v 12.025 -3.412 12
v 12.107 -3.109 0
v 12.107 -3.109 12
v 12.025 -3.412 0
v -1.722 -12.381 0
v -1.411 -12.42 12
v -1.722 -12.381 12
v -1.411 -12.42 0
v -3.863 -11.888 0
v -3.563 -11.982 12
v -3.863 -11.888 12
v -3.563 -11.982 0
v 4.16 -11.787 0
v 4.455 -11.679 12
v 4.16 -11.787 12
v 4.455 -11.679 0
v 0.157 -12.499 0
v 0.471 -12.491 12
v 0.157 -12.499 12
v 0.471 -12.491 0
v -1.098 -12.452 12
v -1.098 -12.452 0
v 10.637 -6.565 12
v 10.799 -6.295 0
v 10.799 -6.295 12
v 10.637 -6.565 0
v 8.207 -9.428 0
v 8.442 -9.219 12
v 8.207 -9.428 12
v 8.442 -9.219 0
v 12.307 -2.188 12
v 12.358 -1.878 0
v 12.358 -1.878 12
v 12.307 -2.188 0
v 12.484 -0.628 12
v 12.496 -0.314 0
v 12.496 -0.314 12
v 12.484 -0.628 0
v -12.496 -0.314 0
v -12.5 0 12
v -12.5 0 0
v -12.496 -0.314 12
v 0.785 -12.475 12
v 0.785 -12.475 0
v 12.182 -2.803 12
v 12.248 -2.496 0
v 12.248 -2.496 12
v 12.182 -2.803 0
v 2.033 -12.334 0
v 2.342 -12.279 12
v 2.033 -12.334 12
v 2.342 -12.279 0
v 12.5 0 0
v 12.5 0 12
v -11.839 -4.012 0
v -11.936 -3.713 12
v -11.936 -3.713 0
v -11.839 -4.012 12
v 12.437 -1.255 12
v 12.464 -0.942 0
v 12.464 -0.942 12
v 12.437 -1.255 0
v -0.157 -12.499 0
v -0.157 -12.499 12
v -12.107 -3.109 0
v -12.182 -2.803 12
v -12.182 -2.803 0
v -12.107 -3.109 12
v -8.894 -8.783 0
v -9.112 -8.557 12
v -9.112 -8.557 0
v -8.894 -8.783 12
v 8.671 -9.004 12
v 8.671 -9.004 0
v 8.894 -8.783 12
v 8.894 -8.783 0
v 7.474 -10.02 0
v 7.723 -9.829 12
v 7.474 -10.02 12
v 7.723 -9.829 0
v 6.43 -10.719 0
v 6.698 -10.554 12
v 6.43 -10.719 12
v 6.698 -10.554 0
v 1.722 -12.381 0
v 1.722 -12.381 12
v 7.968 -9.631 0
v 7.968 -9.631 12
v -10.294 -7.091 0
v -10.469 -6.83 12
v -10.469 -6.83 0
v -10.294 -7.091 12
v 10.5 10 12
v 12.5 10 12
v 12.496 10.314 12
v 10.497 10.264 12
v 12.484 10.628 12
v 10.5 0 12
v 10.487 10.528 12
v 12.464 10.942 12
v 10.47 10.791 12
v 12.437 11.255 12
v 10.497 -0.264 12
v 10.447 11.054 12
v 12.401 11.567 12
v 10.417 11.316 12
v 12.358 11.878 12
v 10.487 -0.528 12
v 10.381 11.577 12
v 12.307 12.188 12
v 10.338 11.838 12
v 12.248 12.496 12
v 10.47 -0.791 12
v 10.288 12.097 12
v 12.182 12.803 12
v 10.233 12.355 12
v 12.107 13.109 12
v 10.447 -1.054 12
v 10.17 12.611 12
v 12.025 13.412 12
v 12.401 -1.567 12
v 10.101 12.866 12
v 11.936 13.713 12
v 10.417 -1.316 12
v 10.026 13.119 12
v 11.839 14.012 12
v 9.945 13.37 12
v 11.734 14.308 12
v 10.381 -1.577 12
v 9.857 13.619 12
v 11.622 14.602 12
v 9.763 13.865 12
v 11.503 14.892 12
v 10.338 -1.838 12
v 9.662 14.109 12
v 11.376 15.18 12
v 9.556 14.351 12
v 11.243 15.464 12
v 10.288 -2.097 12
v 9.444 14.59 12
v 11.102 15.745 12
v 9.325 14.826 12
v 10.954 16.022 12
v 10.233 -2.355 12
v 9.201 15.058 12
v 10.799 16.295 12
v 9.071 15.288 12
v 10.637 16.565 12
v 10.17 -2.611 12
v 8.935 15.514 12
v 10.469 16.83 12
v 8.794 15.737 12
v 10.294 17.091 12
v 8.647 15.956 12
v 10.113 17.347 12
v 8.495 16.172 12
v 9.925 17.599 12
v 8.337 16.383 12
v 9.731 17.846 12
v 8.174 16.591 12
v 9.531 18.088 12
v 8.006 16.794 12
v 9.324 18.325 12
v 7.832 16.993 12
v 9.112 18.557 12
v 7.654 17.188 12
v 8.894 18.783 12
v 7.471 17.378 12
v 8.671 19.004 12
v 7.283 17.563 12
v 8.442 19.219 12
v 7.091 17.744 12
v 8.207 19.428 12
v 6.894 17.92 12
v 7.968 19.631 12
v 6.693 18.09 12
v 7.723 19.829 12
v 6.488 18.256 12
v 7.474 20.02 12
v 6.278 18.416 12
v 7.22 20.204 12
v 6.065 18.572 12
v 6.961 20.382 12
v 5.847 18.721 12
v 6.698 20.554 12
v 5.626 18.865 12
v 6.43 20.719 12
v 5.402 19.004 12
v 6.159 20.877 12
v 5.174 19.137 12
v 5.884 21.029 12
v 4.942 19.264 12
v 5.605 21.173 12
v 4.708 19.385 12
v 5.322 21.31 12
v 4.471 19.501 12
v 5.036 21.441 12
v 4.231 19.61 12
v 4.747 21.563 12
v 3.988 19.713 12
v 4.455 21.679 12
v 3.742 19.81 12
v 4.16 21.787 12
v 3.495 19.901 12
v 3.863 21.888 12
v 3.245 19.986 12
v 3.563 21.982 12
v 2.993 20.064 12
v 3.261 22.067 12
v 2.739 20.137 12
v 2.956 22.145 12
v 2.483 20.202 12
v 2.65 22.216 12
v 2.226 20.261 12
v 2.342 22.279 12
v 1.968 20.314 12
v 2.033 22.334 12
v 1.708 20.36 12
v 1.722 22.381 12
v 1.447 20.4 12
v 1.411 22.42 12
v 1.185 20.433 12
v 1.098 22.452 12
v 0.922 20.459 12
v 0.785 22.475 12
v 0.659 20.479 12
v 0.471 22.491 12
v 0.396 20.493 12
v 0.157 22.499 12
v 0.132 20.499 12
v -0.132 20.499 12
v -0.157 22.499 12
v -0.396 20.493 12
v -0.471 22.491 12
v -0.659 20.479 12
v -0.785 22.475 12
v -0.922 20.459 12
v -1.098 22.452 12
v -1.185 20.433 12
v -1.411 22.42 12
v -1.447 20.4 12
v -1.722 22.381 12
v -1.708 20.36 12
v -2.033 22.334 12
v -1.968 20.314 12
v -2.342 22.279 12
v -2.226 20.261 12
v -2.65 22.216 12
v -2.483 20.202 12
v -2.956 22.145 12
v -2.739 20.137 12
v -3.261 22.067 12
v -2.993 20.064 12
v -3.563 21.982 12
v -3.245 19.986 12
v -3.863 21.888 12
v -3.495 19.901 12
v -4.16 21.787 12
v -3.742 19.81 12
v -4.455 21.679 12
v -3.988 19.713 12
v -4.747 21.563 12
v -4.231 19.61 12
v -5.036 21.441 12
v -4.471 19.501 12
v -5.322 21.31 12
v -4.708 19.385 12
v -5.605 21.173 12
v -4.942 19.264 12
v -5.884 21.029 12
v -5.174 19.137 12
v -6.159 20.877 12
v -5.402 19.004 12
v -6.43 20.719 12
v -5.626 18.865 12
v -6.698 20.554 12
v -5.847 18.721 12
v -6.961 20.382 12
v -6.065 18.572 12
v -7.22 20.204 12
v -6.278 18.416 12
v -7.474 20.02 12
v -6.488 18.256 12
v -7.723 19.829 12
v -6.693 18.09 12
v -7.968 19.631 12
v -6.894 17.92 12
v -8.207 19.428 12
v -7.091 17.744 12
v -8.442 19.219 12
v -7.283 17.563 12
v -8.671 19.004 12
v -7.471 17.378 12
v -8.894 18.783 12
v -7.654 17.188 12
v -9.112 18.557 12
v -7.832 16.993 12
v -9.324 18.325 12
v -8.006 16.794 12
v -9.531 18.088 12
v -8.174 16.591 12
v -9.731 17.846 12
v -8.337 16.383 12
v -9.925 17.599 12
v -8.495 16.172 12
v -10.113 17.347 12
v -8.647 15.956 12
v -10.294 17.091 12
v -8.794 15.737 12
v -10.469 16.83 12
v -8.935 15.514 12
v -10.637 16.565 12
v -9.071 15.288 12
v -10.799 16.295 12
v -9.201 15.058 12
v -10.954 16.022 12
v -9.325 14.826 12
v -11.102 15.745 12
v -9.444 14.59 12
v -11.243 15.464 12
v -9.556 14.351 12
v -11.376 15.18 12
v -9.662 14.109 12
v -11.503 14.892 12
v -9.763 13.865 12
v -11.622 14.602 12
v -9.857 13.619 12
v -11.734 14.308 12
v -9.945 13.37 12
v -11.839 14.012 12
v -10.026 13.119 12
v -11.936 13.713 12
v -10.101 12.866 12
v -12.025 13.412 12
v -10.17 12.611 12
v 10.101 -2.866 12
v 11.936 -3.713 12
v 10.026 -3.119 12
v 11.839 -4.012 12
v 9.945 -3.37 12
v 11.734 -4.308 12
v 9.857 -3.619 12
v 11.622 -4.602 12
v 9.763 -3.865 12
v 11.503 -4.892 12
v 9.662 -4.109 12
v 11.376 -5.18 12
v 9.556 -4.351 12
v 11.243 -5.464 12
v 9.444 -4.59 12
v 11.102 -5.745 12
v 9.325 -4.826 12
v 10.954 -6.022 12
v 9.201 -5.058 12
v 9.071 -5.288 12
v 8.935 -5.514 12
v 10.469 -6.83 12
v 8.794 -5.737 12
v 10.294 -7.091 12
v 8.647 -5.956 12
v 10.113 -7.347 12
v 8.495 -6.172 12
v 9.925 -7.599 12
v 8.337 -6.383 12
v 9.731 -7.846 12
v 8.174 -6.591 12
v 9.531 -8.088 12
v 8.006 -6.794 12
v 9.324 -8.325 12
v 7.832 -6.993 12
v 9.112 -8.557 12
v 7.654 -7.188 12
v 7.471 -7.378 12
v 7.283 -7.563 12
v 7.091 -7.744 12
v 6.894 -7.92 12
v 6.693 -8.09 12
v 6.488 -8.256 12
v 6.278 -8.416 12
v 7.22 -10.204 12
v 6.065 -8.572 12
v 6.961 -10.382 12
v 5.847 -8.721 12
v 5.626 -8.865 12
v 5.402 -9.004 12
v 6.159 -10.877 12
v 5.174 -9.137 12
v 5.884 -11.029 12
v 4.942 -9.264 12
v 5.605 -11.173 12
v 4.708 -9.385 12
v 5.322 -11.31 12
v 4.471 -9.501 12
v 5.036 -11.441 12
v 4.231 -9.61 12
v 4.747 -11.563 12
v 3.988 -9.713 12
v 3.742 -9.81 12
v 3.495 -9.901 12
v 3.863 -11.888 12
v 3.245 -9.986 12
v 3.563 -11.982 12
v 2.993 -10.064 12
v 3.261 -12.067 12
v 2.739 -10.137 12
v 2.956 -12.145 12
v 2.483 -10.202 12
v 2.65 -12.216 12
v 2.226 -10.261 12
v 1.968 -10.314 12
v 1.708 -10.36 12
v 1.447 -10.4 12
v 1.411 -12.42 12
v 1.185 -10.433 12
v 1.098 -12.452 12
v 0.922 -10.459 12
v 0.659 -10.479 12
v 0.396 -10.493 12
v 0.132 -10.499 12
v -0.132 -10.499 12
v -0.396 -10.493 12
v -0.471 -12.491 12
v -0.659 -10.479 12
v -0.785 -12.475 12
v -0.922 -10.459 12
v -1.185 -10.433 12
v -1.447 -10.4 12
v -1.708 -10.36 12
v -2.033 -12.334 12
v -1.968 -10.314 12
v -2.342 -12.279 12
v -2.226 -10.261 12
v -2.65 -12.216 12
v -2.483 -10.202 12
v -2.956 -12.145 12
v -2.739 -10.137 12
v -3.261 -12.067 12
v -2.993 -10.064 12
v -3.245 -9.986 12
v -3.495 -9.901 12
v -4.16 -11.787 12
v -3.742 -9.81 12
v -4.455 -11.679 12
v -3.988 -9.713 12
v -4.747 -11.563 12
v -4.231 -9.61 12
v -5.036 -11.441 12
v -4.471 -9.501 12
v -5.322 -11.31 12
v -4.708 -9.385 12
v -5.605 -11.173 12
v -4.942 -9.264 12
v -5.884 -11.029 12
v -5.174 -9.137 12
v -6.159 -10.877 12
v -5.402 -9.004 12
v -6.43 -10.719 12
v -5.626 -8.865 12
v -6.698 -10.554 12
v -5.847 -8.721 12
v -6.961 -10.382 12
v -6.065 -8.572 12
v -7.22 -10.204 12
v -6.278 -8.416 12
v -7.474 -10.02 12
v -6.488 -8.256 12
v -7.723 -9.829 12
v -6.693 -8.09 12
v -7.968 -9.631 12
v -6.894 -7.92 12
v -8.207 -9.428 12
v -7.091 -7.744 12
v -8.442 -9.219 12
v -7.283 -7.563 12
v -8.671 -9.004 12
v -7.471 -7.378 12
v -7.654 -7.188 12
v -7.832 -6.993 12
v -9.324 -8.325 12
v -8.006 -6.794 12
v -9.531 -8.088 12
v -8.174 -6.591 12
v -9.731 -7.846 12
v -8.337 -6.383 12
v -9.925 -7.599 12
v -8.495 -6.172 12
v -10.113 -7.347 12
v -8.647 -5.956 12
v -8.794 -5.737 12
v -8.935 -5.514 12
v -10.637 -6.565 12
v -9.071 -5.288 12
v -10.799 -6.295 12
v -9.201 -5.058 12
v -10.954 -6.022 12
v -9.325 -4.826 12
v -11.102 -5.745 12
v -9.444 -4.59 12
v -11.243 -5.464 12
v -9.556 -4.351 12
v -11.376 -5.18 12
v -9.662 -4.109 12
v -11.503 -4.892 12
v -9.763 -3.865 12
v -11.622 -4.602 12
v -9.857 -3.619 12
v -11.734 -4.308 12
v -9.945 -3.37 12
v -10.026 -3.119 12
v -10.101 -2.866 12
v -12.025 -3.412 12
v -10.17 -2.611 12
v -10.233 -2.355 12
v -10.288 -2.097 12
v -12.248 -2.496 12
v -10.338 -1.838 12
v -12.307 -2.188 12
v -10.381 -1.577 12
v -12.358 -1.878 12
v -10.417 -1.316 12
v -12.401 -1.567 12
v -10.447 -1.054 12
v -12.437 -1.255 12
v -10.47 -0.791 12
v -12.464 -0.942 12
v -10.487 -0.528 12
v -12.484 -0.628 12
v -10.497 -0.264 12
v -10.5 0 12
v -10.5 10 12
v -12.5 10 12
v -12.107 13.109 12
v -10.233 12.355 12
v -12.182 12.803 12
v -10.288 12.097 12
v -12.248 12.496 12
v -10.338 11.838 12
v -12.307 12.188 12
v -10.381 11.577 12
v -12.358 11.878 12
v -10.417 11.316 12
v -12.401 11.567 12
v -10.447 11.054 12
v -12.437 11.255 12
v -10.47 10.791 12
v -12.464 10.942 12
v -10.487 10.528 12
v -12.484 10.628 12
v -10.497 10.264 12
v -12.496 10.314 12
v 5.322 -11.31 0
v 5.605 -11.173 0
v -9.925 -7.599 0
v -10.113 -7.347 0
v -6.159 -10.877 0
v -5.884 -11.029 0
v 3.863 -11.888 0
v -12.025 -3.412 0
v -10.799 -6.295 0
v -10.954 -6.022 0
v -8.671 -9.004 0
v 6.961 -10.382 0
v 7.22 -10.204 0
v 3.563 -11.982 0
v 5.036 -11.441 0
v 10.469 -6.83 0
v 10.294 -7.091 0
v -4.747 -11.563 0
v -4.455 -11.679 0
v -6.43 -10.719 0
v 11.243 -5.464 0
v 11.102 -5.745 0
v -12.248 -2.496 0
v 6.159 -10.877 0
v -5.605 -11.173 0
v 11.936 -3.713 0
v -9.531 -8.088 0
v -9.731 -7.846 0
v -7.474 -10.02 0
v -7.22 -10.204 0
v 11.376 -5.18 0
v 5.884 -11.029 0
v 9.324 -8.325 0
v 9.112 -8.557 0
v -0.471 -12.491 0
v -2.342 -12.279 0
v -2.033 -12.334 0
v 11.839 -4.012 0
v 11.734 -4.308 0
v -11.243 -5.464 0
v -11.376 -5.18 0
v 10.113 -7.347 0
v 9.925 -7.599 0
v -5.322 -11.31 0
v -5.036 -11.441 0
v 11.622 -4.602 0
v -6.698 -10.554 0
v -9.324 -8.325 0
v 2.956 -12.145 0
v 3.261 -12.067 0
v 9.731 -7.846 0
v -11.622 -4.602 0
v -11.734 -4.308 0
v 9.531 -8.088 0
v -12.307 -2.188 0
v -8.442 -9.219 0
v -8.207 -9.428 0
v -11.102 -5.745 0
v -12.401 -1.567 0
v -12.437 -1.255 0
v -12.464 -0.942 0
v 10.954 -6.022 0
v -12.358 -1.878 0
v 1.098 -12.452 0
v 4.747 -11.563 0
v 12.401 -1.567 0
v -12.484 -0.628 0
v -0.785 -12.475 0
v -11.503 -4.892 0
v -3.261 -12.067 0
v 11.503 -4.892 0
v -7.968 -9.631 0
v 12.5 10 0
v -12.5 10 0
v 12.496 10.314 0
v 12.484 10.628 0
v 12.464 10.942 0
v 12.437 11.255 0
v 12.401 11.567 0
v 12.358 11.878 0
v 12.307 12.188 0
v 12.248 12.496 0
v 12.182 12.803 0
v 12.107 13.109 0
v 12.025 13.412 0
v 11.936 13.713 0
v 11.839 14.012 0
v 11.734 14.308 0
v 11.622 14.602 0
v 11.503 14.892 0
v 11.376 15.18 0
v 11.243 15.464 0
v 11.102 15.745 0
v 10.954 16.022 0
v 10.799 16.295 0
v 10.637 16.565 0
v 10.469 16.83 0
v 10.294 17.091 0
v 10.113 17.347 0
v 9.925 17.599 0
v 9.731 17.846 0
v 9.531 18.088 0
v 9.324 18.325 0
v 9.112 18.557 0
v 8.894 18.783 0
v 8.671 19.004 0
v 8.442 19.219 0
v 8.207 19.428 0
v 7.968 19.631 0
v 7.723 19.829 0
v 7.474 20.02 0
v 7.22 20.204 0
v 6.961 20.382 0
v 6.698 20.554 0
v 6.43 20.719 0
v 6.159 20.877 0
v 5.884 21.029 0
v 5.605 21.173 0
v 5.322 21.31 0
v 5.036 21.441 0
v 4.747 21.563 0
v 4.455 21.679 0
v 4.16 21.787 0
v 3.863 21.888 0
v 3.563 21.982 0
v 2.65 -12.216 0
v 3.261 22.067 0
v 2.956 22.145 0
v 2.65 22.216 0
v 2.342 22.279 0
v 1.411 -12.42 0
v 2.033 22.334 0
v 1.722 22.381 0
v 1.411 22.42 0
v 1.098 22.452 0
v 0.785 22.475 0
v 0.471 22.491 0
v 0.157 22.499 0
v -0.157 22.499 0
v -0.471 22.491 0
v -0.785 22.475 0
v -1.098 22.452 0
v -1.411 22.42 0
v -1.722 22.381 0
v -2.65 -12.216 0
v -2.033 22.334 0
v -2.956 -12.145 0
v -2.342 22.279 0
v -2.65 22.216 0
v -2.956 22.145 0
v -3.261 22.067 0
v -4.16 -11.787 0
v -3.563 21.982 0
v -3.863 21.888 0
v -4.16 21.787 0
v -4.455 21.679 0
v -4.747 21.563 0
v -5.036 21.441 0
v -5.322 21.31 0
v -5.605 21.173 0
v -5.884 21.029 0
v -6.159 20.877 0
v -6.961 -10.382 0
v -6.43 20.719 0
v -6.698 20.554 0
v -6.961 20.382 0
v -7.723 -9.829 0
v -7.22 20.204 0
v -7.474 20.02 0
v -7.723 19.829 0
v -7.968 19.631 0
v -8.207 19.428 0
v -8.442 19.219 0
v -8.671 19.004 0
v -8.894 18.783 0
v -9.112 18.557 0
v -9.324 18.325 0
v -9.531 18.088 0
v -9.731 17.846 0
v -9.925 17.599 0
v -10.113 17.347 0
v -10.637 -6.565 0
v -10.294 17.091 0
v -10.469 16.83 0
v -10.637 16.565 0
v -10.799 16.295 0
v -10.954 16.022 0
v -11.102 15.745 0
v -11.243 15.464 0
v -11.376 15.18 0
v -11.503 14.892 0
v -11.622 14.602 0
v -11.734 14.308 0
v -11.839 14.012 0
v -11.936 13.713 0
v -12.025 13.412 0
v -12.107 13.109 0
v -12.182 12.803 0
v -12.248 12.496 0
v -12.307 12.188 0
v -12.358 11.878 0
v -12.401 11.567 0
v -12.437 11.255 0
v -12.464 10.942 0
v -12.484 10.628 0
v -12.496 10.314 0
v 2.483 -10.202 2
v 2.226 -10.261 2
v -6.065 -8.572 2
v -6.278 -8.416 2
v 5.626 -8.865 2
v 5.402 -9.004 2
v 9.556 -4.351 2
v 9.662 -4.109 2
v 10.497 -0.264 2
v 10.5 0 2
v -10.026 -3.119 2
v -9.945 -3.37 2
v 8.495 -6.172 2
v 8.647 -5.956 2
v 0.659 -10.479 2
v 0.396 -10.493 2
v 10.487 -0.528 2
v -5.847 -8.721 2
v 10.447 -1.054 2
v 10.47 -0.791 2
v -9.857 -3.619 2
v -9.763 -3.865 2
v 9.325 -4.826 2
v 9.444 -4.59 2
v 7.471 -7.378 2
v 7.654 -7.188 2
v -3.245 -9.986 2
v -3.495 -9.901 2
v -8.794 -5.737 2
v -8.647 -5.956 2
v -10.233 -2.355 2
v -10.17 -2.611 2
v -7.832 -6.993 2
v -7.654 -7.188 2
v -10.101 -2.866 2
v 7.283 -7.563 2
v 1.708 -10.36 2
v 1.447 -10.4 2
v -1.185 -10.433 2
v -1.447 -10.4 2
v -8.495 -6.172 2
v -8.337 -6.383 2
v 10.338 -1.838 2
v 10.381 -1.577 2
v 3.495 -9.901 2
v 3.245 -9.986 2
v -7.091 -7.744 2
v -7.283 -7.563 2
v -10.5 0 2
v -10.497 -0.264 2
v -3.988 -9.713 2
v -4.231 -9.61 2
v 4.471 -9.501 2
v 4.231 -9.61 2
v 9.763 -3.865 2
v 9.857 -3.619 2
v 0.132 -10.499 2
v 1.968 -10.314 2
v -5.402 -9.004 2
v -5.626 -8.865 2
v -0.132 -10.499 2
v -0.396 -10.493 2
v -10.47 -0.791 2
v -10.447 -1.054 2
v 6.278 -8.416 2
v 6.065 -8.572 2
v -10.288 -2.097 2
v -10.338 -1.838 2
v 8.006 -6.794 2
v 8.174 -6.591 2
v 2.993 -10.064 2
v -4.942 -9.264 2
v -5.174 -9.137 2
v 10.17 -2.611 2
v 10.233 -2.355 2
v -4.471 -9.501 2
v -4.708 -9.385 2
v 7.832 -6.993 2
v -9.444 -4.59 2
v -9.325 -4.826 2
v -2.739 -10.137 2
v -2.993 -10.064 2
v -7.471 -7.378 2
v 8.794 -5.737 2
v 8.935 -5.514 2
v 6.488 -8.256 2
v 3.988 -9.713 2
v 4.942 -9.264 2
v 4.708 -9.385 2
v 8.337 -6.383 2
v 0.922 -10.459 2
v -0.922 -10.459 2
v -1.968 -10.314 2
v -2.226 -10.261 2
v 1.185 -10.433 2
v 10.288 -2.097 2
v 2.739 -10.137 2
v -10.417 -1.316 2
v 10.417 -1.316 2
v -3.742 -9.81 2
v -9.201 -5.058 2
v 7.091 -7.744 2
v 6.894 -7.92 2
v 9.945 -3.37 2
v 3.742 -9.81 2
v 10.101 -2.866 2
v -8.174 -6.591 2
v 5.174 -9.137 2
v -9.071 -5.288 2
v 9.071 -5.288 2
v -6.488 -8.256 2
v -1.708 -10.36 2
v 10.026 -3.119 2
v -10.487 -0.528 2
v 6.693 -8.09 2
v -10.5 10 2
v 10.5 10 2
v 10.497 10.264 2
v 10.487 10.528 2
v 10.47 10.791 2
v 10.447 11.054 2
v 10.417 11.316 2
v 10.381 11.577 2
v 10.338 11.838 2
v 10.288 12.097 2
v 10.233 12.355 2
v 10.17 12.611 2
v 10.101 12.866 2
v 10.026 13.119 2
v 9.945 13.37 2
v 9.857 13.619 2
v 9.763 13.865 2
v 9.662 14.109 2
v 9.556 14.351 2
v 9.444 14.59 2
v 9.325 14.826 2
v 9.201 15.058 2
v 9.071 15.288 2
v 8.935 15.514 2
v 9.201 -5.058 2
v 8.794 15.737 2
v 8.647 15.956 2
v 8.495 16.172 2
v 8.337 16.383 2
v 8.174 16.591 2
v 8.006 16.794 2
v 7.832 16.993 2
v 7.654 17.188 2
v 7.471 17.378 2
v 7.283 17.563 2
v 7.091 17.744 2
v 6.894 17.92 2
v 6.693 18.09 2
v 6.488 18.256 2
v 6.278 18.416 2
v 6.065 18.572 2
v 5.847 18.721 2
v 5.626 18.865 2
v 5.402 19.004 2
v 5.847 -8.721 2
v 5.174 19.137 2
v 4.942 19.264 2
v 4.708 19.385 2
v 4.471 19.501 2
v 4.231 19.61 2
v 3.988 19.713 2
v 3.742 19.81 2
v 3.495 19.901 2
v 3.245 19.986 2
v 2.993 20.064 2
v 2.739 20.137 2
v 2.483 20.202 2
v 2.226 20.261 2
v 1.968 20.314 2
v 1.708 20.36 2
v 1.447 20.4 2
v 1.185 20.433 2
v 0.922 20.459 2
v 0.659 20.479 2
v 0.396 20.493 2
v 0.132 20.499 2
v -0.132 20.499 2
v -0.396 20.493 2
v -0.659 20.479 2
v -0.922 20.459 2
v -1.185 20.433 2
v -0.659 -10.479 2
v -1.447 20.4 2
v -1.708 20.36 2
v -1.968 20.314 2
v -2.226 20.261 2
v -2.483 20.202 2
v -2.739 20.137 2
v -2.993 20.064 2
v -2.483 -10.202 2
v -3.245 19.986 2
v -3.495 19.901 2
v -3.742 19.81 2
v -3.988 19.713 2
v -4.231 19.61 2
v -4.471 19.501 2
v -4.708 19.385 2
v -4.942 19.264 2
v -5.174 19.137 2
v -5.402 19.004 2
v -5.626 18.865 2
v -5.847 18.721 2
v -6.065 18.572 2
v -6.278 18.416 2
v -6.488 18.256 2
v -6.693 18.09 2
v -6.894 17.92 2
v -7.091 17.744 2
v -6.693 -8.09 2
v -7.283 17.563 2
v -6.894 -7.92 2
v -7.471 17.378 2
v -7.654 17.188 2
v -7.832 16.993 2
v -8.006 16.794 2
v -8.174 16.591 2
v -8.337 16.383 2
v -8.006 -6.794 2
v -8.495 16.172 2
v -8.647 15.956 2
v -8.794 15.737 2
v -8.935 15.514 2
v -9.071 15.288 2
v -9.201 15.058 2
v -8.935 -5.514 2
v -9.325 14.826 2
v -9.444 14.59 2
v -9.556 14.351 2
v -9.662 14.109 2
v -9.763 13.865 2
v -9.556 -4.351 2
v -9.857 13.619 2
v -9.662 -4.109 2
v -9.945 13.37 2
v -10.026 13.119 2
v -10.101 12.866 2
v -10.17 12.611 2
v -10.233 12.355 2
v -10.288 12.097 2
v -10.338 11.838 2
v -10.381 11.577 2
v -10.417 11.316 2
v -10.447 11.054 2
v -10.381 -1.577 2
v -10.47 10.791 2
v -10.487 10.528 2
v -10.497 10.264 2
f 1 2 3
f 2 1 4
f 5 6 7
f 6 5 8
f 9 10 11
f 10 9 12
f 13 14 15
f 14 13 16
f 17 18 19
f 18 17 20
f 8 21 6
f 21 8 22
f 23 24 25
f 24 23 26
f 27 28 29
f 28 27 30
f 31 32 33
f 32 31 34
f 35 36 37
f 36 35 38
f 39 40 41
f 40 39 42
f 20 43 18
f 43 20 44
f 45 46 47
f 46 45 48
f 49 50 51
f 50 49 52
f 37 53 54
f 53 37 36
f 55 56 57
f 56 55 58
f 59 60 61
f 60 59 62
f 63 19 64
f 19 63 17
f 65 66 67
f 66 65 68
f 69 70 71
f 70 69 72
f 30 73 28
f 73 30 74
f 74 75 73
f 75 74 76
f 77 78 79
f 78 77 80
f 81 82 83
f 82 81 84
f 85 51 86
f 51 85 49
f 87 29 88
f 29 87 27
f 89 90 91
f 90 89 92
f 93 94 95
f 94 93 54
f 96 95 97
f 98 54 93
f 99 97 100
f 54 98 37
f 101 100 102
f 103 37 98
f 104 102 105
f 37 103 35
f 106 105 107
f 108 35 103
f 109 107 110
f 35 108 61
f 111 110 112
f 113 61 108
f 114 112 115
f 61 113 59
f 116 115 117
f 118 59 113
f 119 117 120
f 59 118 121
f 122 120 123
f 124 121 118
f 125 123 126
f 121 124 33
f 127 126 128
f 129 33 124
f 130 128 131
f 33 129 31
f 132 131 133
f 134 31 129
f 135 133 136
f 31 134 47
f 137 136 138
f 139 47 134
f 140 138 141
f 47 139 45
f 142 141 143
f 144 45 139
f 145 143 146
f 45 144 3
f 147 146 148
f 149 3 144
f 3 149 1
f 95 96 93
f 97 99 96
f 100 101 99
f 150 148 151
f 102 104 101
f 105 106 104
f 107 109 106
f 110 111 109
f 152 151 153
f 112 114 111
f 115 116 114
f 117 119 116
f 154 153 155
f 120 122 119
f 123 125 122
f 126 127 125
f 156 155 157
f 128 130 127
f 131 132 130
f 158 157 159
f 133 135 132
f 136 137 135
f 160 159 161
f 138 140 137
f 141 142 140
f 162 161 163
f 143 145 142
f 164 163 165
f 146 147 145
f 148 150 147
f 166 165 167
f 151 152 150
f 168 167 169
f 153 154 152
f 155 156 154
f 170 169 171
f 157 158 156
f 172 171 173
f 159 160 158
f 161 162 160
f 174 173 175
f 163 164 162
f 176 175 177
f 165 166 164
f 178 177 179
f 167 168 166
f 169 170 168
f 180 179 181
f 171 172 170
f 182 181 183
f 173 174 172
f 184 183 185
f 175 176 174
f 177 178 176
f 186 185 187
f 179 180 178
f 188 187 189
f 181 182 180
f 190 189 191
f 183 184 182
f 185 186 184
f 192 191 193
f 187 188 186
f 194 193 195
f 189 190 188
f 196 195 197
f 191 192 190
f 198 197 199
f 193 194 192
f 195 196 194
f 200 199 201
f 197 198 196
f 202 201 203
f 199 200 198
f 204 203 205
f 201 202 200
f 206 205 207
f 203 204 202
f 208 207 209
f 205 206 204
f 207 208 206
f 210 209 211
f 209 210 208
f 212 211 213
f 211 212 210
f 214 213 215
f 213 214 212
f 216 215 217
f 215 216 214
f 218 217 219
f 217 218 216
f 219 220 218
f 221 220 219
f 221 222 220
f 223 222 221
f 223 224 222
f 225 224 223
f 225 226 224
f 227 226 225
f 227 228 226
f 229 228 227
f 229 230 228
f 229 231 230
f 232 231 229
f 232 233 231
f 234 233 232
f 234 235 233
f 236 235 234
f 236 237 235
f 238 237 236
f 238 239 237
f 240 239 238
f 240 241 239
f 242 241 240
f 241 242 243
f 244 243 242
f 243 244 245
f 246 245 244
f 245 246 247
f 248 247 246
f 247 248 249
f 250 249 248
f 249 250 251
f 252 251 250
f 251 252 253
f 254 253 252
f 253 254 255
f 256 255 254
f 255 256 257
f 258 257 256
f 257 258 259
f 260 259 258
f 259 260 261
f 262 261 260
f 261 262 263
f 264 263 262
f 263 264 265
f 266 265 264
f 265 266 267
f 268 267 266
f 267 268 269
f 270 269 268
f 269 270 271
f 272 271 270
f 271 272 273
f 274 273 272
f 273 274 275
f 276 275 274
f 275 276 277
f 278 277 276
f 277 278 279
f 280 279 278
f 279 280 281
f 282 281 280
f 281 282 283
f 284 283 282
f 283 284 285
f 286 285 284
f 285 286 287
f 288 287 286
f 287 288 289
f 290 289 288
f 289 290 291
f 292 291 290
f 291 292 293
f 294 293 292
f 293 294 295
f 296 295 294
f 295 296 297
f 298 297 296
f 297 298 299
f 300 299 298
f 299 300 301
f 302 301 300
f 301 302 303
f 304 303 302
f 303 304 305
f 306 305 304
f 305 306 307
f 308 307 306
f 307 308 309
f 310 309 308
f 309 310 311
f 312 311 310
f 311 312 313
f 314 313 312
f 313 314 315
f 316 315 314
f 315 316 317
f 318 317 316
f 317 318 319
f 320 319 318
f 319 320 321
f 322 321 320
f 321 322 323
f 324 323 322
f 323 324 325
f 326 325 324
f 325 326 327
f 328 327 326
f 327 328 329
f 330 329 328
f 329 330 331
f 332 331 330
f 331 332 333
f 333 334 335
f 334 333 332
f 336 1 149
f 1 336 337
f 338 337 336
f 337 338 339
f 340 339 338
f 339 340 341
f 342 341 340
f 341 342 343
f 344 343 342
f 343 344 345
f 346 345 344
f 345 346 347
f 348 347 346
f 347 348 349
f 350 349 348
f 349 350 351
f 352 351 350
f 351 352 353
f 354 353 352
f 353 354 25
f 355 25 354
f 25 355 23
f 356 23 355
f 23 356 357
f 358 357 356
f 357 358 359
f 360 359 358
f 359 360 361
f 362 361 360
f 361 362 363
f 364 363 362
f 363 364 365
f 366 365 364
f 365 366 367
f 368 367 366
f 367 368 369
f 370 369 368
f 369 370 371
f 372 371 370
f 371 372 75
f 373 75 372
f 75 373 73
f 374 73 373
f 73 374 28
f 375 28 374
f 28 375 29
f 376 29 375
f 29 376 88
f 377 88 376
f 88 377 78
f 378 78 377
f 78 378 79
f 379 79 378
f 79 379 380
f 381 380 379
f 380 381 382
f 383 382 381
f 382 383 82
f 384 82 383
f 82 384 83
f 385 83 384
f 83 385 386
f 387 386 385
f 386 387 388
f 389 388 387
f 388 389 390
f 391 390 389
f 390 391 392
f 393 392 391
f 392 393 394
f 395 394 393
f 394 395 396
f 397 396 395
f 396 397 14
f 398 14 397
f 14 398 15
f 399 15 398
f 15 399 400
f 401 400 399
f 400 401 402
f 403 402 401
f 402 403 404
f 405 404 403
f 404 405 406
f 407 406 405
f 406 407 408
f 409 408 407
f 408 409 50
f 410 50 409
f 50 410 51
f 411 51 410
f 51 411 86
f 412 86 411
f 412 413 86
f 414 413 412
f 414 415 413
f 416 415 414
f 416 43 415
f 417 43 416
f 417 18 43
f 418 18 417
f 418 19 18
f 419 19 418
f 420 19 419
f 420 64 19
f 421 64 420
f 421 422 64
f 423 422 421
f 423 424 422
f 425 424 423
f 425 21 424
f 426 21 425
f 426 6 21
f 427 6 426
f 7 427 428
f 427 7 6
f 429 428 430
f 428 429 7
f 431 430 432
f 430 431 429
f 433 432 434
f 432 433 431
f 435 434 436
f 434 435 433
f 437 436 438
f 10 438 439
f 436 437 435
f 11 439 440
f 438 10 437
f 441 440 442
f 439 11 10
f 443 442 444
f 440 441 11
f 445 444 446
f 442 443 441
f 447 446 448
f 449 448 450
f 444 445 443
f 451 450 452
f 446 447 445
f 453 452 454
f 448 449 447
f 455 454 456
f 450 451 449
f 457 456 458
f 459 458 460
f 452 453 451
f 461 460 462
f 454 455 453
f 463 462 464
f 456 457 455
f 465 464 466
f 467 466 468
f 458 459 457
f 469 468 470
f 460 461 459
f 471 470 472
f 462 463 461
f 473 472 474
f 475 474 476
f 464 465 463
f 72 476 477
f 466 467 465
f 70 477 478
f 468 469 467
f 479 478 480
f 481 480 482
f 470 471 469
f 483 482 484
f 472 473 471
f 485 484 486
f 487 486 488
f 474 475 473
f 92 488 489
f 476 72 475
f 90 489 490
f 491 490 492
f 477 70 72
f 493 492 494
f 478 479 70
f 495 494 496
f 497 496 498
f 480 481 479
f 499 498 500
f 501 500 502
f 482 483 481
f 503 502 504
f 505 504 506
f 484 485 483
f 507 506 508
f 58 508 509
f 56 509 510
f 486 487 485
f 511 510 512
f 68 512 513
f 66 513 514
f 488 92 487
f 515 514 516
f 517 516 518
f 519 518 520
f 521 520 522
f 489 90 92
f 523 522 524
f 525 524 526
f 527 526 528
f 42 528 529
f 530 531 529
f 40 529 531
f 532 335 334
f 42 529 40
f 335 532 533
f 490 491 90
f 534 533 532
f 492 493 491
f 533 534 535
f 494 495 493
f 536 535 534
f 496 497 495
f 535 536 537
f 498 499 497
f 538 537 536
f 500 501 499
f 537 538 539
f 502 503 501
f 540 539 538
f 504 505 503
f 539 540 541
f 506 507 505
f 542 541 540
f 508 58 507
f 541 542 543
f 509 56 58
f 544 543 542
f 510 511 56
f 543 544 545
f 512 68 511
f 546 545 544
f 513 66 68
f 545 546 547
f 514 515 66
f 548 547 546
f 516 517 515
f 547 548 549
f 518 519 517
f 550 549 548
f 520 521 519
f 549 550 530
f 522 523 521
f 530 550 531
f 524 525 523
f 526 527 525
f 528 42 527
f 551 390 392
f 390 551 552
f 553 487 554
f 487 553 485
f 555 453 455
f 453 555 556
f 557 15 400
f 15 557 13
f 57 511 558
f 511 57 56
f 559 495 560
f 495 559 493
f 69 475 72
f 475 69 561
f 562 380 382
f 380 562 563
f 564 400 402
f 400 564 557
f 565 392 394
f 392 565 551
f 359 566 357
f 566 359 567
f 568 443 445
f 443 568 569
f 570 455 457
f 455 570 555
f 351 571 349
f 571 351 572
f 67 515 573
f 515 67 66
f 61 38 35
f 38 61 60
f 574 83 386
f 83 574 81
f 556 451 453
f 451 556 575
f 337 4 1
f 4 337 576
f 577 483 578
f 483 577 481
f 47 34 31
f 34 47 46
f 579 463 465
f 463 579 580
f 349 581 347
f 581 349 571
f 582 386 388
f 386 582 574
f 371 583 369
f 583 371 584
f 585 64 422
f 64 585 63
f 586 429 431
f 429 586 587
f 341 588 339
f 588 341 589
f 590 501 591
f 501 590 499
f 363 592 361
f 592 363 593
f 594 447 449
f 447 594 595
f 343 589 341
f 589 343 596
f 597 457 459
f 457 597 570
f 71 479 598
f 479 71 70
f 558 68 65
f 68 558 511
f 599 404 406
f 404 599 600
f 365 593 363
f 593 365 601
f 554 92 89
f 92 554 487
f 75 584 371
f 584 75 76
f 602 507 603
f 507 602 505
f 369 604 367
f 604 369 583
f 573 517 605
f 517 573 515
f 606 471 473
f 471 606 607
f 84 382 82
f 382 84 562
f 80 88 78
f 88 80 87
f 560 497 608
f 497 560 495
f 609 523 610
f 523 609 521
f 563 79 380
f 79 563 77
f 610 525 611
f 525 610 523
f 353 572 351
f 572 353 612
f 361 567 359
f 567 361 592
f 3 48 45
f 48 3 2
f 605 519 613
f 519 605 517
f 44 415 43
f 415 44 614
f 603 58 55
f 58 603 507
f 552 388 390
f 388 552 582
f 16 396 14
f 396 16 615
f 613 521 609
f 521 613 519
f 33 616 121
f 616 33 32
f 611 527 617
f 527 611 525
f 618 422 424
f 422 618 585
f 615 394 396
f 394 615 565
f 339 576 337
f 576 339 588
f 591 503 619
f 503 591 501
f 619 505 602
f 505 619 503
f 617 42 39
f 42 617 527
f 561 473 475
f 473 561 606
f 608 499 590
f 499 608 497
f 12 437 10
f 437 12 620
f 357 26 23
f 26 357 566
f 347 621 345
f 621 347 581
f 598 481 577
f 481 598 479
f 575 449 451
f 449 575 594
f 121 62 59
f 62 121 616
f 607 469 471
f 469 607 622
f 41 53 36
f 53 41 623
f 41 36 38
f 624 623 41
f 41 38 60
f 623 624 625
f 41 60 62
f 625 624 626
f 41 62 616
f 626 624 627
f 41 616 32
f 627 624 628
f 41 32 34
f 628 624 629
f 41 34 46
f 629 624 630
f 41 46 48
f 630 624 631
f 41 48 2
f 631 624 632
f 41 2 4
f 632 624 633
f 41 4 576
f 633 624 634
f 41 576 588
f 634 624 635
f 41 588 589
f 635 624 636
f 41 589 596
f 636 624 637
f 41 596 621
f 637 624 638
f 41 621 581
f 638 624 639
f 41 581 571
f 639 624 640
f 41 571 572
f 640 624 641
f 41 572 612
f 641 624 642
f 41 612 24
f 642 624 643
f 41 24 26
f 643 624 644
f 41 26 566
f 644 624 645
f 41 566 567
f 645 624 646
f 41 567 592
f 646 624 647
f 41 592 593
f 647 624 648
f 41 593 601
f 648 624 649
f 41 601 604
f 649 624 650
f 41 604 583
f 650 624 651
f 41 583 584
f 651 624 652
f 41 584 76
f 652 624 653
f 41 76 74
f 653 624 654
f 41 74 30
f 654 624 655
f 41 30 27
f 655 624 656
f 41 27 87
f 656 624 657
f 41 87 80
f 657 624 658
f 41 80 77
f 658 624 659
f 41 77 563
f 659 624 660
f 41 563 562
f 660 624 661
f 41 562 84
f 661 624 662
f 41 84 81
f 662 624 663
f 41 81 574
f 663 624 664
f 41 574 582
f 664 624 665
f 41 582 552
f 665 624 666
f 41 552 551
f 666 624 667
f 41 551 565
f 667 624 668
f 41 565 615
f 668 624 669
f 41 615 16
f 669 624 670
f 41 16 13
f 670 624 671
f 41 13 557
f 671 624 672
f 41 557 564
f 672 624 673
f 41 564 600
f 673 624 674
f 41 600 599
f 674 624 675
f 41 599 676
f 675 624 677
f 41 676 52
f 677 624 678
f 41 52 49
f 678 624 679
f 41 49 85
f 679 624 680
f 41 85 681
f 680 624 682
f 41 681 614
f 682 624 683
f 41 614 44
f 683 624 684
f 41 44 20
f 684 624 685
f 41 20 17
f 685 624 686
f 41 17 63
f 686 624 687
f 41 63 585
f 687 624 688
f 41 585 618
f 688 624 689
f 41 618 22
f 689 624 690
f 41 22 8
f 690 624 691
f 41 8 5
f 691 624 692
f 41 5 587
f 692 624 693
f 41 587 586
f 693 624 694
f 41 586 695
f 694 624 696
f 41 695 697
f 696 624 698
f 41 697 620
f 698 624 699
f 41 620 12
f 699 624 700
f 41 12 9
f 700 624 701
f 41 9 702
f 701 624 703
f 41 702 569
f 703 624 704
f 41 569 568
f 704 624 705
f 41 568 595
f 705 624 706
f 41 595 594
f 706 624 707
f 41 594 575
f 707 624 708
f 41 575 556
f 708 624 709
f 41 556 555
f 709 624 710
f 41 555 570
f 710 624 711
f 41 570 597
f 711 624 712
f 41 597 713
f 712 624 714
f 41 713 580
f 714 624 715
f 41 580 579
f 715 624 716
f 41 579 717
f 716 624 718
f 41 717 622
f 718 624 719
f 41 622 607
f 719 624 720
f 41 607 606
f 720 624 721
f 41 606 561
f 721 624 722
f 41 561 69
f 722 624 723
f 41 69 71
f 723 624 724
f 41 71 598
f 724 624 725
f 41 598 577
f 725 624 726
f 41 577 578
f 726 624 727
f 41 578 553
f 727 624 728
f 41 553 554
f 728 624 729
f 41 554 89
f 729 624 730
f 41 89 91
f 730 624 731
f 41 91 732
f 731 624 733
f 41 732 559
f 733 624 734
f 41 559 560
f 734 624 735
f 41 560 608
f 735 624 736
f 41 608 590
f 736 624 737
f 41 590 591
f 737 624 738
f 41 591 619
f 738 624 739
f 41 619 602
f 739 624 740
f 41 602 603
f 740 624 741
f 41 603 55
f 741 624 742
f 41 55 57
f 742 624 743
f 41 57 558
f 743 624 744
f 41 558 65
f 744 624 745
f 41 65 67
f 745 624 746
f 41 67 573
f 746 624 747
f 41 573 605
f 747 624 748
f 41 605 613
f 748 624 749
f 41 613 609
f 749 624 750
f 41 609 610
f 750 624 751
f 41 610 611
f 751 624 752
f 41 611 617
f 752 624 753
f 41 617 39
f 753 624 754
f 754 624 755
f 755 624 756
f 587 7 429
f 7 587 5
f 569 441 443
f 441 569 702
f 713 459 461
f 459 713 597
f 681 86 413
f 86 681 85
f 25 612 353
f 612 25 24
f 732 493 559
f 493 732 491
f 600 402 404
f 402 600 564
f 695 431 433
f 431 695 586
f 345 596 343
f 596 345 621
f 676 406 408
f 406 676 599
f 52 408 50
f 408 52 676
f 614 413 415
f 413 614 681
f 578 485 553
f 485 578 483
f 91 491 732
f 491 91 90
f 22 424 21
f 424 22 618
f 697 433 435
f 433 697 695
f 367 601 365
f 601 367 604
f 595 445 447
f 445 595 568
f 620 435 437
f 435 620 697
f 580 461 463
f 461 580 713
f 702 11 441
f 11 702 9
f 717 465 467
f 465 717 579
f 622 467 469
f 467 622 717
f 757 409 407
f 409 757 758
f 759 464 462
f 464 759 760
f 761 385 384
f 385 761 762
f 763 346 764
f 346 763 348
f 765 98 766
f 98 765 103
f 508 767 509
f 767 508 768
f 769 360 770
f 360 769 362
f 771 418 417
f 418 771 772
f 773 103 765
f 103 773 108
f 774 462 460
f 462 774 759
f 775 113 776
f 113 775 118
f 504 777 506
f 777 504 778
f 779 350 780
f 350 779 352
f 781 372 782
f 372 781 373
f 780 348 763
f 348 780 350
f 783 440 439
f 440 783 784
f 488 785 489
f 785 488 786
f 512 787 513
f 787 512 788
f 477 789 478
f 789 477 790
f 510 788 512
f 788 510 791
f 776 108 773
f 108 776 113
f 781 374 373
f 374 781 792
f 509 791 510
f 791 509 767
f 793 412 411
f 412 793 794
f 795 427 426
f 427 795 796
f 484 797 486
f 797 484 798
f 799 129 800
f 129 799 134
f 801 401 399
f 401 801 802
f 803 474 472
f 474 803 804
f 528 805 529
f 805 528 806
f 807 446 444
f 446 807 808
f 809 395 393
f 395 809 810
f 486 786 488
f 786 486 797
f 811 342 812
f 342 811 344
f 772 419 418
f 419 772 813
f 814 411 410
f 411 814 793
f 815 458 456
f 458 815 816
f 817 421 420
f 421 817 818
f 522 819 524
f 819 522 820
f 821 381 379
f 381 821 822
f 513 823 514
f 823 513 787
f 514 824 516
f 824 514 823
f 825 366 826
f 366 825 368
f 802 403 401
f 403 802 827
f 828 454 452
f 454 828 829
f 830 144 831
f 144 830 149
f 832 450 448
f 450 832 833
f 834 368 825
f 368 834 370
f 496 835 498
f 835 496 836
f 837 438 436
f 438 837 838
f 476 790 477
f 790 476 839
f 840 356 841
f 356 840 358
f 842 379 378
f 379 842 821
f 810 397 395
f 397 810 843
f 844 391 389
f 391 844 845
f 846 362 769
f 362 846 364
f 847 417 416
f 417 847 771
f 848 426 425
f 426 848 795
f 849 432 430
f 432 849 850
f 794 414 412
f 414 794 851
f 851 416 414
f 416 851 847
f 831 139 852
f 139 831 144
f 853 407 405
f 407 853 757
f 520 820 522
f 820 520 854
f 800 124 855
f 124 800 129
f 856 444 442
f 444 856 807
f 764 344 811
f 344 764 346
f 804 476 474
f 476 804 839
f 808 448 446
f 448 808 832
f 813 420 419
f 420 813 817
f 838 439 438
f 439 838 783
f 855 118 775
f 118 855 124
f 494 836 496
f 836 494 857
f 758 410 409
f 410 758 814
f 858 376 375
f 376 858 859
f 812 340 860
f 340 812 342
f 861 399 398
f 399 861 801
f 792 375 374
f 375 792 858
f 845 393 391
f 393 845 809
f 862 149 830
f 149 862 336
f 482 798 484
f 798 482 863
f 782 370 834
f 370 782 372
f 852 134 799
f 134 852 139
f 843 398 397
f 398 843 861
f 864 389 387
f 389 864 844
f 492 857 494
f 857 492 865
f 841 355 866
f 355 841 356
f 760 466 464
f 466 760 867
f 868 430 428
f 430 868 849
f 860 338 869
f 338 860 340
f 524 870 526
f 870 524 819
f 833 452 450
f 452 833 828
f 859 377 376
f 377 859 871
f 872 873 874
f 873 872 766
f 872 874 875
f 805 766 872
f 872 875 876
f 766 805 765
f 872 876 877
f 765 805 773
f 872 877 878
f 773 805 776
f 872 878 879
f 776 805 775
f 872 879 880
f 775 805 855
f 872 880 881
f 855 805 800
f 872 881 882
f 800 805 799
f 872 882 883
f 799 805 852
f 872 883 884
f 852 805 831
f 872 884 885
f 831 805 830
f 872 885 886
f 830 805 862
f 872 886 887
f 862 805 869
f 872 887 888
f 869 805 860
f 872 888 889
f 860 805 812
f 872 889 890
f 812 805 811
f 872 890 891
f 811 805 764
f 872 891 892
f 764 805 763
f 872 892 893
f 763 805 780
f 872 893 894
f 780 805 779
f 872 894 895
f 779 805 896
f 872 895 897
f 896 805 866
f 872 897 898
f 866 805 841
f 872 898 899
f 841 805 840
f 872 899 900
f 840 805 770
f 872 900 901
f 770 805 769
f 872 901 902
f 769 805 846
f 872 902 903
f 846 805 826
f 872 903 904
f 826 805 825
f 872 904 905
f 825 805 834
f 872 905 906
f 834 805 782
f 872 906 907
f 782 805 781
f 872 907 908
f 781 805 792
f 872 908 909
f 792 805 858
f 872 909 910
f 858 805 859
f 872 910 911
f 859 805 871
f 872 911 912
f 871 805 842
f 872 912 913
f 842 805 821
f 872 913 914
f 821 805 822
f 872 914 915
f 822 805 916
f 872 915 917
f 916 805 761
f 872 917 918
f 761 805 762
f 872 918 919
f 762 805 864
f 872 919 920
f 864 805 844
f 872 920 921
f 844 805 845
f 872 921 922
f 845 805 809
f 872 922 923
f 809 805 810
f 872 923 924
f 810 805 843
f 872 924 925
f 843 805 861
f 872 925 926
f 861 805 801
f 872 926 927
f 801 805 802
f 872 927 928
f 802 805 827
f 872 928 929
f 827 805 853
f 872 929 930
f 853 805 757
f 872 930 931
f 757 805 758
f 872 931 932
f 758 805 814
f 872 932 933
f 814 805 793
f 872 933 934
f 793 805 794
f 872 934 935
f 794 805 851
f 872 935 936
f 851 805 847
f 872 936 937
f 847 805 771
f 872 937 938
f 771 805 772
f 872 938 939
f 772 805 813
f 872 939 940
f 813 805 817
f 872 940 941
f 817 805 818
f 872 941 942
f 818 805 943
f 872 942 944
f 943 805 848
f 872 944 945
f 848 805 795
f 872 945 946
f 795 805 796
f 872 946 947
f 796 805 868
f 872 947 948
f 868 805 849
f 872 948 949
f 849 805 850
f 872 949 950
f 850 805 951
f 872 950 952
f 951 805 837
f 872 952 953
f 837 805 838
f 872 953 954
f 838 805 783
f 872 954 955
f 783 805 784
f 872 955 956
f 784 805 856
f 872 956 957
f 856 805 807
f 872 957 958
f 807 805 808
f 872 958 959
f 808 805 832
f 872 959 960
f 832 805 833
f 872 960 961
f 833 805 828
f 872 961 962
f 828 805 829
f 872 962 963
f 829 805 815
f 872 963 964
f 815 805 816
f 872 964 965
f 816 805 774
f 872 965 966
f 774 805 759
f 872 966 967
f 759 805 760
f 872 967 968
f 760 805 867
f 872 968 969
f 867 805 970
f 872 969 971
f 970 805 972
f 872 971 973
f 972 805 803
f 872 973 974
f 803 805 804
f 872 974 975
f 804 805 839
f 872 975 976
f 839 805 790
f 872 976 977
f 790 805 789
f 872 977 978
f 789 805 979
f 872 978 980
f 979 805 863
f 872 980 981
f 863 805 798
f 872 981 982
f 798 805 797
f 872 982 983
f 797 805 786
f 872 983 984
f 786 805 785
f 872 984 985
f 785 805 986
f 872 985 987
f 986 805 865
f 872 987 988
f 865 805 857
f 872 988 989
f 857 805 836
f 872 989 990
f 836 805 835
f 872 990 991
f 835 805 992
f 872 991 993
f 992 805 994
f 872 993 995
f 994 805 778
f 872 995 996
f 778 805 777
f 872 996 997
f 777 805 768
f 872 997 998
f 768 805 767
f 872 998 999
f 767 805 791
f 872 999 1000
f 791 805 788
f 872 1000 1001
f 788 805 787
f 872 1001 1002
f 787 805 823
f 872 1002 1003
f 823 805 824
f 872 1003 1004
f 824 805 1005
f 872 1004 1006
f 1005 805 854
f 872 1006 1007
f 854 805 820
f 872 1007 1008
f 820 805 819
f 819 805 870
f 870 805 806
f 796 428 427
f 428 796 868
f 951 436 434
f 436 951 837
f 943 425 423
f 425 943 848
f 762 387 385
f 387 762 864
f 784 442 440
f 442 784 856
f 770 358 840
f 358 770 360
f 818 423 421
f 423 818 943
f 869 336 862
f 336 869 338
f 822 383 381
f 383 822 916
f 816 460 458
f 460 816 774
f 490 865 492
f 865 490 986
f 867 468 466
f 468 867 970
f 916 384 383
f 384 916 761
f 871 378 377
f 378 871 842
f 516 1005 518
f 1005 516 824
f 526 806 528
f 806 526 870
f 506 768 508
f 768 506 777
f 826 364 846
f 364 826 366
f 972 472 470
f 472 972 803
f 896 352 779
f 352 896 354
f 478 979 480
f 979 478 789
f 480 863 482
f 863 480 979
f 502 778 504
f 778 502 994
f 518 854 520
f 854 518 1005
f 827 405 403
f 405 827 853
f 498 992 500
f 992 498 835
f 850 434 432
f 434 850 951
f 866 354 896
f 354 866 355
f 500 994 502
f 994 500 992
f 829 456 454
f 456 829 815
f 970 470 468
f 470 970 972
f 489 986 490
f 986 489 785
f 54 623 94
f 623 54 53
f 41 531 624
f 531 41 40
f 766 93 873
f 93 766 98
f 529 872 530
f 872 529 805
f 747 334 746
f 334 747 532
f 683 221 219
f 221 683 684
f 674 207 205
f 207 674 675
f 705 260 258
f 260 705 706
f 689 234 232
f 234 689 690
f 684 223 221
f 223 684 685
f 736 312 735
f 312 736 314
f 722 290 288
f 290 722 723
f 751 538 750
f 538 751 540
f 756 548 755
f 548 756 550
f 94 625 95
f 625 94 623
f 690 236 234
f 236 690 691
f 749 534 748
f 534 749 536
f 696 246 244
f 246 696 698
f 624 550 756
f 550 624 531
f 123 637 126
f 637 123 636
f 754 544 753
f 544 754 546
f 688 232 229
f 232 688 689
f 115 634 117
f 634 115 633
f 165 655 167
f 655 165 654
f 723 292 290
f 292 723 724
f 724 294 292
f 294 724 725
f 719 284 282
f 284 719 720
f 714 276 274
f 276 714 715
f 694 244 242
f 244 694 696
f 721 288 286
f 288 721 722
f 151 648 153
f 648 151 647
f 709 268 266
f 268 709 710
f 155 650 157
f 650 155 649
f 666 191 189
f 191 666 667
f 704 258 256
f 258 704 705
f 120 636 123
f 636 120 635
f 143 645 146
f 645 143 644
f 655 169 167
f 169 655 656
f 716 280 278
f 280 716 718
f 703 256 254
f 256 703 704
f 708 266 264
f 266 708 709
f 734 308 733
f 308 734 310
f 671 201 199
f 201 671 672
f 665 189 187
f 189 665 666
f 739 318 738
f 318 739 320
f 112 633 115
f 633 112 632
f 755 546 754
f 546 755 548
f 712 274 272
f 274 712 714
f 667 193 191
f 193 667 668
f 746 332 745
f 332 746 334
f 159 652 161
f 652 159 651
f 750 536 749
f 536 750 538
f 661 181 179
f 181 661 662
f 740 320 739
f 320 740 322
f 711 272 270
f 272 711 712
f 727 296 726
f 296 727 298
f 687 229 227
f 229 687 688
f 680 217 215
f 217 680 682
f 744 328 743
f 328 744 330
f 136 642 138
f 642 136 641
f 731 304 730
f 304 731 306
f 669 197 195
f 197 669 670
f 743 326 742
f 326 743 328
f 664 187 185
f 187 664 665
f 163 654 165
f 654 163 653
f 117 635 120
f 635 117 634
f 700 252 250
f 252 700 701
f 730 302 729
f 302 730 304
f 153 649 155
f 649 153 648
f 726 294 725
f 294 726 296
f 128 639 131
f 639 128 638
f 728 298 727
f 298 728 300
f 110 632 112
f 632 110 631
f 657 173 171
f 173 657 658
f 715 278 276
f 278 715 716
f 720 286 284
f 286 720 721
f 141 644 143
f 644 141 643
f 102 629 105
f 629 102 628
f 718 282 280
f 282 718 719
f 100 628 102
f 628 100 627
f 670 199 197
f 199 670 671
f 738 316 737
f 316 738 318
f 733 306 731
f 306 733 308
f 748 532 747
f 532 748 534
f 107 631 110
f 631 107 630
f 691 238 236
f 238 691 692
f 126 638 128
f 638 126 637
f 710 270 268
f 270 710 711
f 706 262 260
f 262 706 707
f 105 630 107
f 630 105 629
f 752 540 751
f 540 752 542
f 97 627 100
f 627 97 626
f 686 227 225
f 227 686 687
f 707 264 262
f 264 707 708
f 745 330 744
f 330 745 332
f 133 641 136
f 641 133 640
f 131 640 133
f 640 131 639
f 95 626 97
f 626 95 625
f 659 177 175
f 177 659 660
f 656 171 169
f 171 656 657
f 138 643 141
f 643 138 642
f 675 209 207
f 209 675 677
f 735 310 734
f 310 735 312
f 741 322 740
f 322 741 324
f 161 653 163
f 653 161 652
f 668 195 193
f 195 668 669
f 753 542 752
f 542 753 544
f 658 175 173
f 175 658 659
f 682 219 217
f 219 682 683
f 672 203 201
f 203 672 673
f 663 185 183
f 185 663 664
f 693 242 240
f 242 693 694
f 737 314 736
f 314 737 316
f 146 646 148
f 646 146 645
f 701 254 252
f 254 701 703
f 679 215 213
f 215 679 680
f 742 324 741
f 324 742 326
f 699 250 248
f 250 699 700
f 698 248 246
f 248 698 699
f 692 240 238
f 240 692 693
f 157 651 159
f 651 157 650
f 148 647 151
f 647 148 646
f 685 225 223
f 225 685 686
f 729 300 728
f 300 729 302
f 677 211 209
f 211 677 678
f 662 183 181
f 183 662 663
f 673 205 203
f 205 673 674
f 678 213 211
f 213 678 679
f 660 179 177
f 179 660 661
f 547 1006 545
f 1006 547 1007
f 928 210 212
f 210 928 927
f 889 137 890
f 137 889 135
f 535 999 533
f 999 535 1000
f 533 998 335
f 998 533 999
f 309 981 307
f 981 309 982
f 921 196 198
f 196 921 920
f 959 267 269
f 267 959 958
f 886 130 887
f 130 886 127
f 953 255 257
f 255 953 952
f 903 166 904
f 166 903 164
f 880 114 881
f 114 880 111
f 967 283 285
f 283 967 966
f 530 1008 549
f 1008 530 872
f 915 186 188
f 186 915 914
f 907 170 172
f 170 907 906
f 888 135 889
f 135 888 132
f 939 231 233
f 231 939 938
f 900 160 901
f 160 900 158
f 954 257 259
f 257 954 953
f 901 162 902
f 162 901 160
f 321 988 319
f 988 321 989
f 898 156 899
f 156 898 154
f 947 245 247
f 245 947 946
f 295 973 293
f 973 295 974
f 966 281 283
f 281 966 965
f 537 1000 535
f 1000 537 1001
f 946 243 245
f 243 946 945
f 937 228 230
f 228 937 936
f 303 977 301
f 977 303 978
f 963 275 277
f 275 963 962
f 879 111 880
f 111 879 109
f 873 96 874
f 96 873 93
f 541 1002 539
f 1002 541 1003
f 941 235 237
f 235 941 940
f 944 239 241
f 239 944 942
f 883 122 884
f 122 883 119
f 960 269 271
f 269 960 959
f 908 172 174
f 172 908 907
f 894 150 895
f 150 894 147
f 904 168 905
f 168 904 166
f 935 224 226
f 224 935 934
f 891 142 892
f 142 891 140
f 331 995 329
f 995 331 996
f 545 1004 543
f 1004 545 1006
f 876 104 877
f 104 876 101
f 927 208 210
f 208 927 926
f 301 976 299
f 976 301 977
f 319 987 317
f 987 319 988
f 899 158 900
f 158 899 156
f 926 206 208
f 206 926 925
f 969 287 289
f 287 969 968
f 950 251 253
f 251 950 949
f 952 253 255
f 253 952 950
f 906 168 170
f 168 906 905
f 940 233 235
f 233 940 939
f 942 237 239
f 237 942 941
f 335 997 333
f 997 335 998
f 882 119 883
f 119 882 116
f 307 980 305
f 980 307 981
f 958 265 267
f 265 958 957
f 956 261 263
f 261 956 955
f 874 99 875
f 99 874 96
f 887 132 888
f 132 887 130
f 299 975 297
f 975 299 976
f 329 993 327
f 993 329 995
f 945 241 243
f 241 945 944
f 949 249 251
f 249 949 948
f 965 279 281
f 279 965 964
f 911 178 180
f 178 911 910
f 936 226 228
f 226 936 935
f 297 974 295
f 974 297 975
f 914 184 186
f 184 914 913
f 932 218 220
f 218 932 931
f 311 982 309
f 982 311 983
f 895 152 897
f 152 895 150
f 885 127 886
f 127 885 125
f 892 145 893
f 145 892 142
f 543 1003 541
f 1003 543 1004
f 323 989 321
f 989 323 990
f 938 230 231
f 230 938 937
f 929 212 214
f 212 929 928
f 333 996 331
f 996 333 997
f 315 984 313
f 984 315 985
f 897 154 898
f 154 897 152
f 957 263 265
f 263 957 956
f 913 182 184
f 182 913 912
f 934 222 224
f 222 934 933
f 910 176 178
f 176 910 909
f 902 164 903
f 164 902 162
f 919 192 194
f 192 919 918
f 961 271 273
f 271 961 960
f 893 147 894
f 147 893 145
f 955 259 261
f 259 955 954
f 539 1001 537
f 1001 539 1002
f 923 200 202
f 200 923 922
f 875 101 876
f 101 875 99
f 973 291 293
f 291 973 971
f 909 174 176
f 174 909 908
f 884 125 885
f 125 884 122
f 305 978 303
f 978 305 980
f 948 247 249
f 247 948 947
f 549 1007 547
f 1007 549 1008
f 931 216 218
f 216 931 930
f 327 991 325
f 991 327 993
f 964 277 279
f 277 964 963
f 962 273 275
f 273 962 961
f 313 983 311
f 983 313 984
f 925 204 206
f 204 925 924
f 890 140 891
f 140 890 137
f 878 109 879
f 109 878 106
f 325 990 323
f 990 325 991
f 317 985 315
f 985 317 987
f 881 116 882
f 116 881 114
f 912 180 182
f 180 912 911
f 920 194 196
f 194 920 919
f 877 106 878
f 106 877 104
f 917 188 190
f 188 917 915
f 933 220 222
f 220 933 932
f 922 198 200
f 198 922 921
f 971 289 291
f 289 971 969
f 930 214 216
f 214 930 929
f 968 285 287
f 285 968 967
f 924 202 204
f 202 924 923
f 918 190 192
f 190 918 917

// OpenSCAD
 radius_bottom = 12.5;
 radius_top = 15;
 radius = 12.5;
 length = 25;
 width = 10;
 height = 10+2;
 thickness =2;
 
 resolution=250;

//translate([length,10,height])
// difference() {
// cylinder(h=height, r1=radius_bottom, r2=radius_top, center=false);
// translate([-radius_top,0,0])
// cube([radius_top*2,radius_top*2,height]);
// cylinder(h=height, r1=radius_bottom-2, r2=radius_top-2, center=false);
// }

//translate([0,40,0])

 
 //translate([0,radius_bottom/2+10,0])
 //rotate([0,0,45])
 //cylinder(h=height,r1=radius_bottom*1.414,r2=radius_top*1.414,$fn=4);
 $fn=resolution;
 
 difference() {
 cylinder(h=height,r=radius);
 translate([0,0,thickness])
 cylinder(h=height-thickness, r=radius-thickness); 
 translate([-radius,0,thickness])
 cube([radius*2,radius*2,height]);
 }
 
 difference() {
 translate([-length/2,0,0])
 cube([length,width,height]);
     
 //translate([-length/2,0,thickness])
 //cube([length,width,height-thickness]);
     
 translate([-(length-thickness*2)/2,0,thickness])
 cube([length-thickness*2,width,height-thickness]);
 }
 
 translate([0,width,0])
 rotate([0,0,180])
 difference() {
 cylinder(h=height,r=radius);
 translate([0,0,thickness])
 cylinder(h=height-thickness, r=radius-thickness); 
 translate([-radius,0,thickness])
 cube([radius*2,radius*2,height]);
 }
 

 
